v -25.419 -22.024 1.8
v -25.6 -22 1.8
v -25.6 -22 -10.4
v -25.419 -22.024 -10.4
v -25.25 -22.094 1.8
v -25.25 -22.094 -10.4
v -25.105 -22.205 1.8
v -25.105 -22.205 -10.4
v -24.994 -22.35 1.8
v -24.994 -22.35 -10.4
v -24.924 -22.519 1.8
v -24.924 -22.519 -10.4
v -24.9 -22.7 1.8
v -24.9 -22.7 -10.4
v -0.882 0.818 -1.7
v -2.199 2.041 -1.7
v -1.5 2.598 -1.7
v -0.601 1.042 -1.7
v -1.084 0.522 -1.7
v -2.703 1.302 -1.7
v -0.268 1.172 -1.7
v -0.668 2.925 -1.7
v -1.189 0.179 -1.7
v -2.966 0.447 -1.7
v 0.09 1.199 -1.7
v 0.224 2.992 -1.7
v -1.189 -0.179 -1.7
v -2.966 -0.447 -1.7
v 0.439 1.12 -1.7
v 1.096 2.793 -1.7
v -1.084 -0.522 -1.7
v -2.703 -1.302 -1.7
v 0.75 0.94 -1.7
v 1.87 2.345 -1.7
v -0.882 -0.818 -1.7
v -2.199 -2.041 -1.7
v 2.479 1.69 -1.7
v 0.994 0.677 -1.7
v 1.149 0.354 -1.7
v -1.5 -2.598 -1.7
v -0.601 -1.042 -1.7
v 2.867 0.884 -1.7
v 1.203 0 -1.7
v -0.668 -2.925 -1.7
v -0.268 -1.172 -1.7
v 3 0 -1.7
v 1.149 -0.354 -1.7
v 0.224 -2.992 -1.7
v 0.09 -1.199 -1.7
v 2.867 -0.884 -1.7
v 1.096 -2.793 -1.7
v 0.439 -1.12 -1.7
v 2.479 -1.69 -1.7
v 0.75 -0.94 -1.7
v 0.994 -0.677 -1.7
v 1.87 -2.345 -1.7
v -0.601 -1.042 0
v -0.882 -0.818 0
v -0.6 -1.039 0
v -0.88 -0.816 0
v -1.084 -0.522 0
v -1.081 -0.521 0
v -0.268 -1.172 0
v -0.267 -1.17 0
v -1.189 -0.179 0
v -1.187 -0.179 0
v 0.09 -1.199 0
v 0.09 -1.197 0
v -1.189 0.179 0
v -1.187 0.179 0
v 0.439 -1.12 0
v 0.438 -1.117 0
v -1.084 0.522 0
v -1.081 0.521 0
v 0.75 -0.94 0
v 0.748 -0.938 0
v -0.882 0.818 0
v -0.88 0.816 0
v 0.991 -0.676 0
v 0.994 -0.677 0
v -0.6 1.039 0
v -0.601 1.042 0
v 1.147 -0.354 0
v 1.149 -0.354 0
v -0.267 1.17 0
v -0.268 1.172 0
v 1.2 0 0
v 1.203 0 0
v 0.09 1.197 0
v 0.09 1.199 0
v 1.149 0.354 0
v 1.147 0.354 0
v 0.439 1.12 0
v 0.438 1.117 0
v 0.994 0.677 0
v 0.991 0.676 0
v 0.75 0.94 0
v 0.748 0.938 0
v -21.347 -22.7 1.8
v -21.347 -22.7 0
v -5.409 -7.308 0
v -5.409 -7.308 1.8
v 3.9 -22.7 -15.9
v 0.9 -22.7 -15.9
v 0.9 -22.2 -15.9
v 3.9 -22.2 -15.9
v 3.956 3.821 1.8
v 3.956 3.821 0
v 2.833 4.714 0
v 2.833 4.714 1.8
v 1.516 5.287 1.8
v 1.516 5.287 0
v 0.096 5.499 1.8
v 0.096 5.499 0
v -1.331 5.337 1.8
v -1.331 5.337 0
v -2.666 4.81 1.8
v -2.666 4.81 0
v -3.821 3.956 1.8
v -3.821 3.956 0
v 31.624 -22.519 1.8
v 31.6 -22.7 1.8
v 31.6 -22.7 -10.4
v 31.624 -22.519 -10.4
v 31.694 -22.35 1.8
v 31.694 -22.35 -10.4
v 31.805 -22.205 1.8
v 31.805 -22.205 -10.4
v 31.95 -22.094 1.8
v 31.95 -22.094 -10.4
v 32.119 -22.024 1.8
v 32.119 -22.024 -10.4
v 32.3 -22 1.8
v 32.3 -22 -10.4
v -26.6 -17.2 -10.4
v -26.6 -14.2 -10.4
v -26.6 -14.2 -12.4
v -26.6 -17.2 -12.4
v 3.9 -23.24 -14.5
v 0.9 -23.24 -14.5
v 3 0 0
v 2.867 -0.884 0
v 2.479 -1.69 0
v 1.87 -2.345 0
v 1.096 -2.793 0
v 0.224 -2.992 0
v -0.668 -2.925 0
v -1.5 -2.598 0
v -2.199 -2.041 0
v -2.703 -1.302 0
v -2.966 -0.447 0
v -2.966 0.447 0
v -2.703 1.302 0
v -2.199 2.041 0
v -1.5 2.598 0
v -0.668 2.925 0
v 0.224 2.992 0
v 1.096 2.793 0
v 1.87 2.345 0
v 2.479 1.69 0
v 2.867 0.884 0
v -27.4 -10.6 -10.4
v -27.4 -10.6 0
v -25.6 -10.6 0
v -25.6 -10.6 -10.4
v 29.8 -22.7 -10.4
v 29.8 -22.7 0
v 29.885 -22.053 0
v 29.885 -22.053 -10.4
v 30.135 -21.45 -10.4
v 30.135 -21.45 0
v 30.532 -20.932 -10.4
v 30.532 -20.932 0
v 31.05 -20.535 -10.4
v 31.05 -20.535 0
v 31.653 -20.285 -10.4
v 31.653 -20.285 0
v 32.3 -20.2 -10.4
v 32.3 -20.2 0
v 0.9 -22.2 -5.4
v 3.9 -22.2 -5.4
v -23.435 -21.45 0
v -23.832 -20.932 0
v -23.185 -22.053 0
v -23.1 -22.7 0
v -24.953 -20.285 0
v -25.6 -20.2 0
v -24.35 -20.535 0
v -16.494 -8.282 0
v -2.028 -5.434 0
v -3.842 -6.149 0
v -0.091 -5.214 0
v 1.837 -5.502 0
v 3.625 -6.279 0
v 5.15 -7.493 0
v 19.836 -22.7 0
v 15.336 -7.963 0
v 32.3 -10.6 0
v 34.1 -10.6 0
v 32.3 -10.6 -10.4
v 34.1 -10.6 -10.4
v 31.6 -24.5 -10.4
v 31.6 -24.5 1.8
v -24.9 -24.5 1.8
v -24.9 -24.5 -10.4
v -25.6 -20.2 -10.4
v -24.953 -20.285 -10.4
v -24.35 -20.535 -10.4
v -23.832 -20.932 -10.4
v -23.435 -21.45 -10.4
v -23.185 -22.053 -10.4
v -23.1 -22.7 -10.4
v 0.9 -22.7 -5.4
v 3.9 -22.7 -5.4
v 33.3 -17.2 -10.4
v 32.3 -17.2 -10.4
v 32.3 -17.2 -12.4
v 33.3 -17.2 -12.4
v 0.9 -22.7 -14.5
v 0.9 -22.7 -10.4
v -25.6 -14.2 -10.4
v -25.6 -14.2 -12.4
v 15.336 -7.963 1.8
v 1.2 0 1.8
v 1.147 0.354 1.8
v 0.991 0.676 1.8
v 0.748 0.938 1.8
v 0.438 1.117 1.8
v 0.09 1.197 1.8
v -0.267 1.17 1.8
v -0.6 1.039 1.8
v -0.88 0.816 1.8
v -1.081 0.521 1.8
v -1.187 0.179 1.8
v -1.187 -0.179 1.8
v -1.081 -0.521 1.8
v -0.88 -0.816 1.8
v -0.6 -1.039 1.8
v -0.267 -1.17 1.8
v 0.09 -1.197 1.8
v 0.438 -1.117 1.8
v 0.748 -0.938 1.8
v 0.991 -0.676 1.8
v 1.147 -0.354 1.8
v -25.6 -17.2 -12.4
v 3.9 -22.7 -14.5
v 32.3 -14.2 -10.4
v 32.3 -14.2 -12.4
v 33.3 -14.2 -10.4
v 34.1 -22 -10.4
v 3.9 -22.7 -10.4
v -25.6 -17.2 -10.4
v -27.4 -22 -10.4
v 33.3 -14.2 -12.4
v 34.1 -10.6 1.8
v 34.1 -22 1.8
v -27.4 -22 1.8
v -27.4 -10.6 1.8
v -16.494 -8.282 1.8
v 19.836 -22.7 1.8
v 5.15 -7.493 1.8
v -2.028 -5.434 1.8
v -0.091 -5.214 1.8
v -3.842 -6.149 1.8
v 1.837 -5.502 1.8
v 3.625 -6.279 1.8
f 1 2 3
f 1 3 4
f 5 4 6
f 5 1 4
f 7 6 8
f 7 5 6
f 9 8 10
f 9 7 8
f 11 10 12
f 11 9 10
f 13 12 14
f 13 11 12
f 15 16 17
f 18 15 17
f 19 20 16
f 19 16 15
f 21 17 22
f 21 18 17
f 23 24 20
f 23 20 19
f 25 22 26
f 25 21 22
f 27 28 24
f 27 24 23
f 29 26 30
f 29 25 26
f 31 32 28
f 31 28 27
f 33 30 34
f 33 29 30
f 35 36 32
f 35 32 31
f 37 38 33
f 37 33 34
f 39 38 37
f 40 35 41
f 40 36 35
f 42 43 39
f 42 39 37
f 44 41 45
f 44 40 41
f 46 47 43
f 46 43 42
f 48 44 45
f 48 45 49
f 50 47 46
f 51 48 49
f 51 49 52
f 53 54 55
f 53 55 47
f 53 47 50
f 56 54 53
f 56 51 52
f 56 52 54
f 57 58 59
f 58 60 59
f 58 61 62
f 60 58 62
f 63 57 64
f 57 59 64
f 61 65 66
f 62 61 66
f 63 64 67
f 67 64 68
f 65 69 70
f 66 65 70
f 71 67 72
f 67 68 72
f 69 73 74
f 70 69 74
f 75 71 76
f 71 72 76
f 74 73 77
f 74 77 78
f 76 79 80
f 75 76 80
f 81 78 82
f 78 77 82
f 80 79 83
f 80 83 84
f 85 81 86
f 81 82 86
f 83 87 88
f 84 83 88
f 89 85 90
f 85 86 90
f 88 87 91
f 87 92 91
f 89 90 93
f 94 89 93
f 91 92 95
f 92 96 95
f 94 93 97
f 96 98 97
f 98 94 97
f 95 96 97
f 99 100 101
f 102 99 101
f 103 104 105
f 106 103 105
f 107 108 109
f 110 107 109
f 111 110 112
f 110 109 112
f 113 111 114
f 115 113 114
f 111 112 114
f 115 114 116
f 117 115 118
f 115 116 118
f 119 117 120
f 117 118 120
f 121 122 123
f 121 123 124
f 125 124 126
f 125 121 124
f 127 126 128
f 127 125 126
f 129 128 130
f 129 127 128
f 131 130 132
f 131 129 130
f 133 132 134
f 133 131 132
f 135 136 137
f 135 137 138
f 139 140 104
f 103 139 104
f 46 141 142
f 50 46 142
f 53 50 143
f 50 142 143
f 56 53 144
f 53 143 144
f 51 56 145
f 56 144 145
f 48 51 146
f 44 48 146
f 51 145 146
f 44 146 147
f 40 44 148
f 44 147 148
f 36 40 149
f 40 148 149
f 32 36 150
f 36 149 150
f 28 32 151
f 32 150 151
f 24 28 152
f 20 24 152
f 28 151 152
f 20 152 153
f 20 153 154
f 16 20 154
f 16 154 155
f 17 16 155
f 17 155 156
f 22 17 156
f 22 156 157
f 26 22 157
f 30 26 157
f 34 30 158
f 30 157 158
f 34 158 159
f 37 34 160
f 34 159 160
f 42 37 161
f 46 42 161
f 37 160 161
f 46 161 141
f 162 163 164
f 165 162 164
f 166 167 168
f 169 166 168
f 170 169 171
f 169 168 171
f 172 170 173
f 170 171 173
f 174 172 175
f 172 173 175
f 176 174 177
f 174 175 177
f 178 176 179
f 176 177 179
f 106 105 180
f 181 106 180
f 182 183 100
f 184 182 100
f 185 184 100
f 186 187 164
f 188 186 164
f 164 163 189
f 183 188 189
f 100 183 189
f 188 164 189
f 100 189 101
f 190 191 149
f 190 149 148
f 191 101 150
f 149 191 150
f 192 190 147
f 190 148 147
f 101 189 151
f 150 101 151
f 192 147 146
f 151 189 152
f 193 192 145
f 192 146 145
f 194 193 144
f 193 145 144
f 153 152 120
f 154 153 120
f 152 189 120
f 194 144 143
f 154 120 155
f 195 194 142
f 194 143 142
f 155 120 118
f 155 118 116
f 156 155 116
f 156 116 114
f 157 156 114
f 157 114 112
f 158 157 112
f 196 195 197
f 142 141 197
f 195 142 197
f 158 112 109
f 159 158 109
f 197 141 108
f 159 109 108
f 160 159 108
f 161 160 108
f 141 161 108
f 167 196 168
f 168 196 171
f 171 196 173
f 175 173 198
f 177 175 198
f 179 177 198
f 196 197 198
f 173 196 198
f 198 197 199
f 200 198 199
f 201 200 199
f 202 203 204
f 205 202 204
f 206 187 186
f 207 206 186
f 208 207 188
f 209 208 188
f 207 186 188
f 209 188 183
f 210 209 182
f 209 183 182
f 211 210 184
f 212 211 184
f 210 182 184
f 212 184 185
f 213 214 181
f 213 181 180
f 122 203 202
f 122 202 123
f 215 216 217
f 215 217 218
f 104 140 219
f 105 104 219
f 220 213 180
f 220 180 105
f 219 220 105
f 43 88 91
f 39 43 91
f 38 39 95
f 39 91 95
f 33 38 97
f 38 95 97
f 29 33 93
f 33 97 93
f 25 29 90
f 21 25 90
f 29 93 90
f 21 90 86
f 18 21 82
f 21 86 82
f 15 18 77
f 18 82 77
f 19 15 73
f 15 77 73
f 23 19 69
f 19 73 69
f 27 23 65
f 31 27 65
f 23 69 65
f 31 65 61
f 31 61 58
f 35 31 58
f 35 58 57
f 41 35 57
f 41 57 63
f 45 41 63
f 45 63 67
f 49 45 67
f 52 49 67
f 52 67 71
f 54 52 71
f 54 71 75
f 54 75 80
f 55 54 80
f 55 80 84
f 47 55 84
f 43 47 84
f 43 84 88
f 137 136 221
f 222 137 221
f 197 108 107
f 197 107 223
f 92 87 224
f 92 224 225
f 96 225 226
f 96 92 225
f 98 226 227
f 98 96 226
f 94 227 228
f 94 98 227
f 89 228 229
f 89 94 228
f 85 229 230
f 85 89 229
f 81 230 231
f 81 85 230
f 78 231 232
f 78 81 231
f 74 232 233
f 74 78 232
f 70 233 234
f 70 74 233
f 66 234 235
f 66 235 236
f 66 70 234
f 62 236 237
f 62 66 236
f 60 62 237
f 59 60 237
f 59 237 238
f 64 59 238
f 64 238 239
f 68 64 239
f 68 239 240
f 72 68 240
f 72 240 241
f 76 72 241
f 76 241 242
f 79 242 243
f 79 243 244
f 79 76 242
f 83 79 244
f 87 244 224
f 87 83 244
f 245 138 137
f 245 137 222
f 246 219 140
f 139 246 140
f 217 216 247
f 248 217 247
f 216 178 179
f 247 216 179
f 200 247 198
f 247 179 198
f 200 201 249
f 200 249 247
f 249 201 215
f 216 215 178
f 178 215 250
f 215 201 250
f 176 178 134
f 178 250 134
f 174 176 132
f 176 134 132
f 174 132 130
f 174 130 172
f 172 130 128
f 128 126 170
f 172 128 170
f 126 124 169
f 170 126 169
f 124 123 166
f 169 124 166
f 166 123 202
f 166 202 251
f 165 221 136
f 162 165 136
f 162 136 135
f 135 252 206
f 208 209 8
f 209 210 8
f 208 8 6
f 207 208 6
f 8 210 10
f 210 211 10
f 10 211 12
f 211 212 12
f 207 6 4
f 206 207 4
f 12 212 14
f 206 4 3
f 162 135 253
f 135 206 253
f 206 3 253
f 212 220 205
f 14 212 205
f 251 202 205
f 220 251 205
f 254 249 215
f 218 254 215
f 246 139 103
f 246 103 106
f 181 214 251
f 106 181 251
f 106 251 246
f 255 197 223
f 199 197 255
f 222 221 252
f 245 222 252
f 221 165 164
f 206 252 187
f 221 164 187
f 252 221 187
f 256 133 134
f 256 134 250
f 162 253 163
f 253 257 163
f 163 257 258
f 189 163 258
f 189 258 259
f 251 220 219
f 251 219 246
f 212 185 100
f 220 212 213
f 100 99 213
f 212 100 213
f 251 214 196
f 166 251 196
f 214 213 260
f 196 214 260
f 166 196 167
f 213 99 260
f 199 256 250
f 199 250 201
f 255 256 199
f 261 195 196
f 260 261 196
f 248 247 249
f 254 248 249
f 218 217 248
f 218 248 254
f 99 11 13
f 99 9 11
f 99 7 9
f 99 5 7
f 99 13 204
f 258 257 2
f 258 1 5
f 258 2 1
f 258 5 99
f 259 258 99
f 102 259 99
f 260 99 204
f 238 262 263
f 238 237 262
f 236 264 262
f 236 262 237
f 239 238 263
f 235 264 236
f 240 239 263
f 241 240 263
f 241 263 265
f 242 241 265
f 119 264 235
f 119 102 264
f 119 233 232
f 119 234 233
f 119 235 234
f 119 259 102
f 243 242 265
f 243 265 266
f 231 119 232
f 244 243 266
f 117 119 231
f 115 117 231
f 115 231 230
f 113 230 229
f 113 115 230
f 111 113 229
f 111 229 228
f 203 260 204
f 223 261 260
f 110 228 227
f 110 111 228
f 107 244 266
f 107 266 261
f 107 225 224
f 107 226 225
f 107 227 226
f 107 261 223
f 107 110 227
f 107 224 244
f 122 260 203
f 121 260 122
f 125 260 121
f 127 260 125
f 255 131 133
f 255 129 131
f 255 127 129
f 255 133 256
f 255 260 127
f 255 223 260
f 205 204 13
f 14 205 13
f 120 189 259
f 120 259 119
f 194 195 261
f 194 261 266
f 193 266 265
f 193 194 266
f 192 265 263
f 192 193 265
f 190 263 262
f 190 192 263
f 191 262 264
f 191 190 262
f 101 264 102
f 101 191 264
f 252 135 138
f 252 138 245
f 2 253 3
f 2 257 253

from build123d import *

# Parameters (mm, degrees)
SKETCH_R     = 1.2
PAD_DEPTH    = 1.8
PAD001_DEPTH = 10.4
SKETCH002_W  = 3
SKETCH002_H  = 5
PAD002_DEPTH = 0.5
SKETCH003_W  = 3
SKETCH003_H  = 0.5
PAD003_DEPTH = 4.1
PAD004_DEPTH = 3
SKETCH006_W  = 1
SKETCH006_H  = 3
PAD005_DEPTH = 2
SKETCH007_R  = 3
PAD006_DEPTH = 1.7
SKETCH008_R  = 1.202636
POCKET_DEPTH = 15.901


with BuildPart() as part:
    # Sketch → Pad (new body)
    with BuildSketch(Plane.XY):
        with BuildLine():
            Line((-24.9, -24.5), (31.6, -24.5))
            Line((31.6, -24.5), (31.6, -22.7))
            ThreePointArc((32.3, -22), (31.805025, -22.205025), (31.6, -22.7))
            Line((32.3, -22), (34.1, -22))
            Line((34.1, -22), (34.1, -10.6))
            Line((15.335508, -7.962823), (34.1, -10.6))
            Line((3.956369, 3.820621), (15.335508, -7.962823))
            ThreePointArc((3.956369, 3.820621), (0.095988, 5.499162), (-3.820621, 3.956369))
            Line((-16.493585, -8.28177), (-3.820621, 3.956369))
            Line((-27.4, -10.6), (-16.493585, -8.28177))
            Line((-27.4, -22), (-27.4, -10.6))
            Line((-25.6, -22), (-27.4, -22))
            ThreePointArc((-24.9, -22.7), (-25.105025, -22.205025), (-25.6, -22))
            Line((-24.9, -24.5), (-24.9, -22.7))
        make_face()
        Circle(SKETCH_R, mode=Mode.SUBTRACT)
        with BuildLine():
            Line((-21.347203, -22.7), (19.83589, -22.7))
            Line((5.150202, -7.492526), (19.83589, -22.7))
            ThreePointArc((5.150202, -7.492526), (-0.091003, -5.213584), (-5.40855, -7.308222))
            Line((-21.347203, -22.7), (-5.40855, -7.308222))
        make_face(mode=Mode.SUBTRACT)
    extrude(amount=PAD_DEPTH)

    # Sketch001 → Pad001 (new body)
    with BuildSketch(Plane(origin=(0, 0, 0), x_dir=(1, 0, 0), z_dir=(0, 0, -1))):
        with BuildLine():
            Line((-27.4, 22), (-25.6, 22))
            ThreePointArc((-25.6, 22), (-25.105025, 22.205025), (-24.9, 22.7))
            Line((-24.9, 24.5), (-24.9, 22.7))
            Line((31.6, 24.5), (-24.9, 24.5))
            Line((31.6, 24.5), (31.6, 22.7))
            ThreePointArc((31.6, 22.7), (31.805025, 22.205025), (32.3, 22))
            Line((32.3, 22), (34.1, 22))
            Line((34.1, 22), (34.1, 10.6))
            Line((32.300003, 10.6), (34.1, 10.6))
            Line((32.300003, 20.2), (32.300003, 10.6))
            ThreePointArc((29.8, 22.7), (30.532234, 20.932232), (32.300003, 20.2))
            Line((-23.1, 22.7), (29.8, 22.7))
            ThreePointArc((-25.6, 20.2), (-23.832233, 20.932233), (-23.1, 22.7))
            Line((-25.6, 10.6), (-25.6, 20.2))
            Line((-27.4, 10.6), (-25.6, 10.6))
            Line((-27.4, 22), (-27.4, 10.6))
        make_face()
    extrude(amount=PAD001_DEPTH)

    # Sketch002 → Pad002 (new body)
    with BuildSketch(Plane(origin=(0, -22.7, 0), x_dir=(-1, 0, 0), z_dir=(0, 1, 0))):
        with Locations((-2.4, -7.9)):
            Rectangle(SKETCH002_W, SKETCH002_H)
    extrude(amount=PAD002_DEPTH)

    # Sketch003 → Pad003 (new body)
    with BuildSketch(Plane(origin=(0, 0, -10.4), x_dir=(1, 0, 0), z_dir=(0, 0, -1))):
        with Locations((2.4, 22.45)):
            Rectangle(SKETCH003_W, SKETCH003_H)
    extrude(amount=PAD003_DEPTH)

    # Sketch005 → Pad004 (new body)
    with BuildSketch(Plane(origin=(0.9, 0, 0), x_dir=(0, -1, 0), z_dir=(-1, 0, 0))):
        Polygon((22.2, -14.5), (23.24, -14.5), (22.7, -15.9), (22.2, -15.9), align=None)
    extrude(amount=-PAD004_DEPTH)

    # Sketch006 → Pad005 (new body)
    with BuildSketch(Plane(origin=(0, 0, -10.4), x_dir=(1, 0, 0), z_dir=(0, 0, -1))):
        with Locations((-26.1, 15.7)):
            Rectangle(SKETCH006_W, SKETCH006_H)
        with Locations((32.800003, 15.7)):
            Rectangle(SKETCH006_W, SKETCH006_H)
    extrude(amount=PAD005_DEPTH)

    # Sketch007 → Pad006 (new body)
    with BuildSketch(Plane(origin=(0, 0, 0), x_dir=(1, 0, 0), z_dir=(0, 0, -1))):
        Circle(SKETCH007_R)
    extrude(amount=PAD006_DEPTH)

    # Sketch008 → Pocket (cut, through all)
    with BuildSketch(Plane.XY):
        Circle(SKETCH008_R)
    extrude(amount=-POCKET_DEPTH, mode=Mode.SUBTRACT)


solid = part.part
